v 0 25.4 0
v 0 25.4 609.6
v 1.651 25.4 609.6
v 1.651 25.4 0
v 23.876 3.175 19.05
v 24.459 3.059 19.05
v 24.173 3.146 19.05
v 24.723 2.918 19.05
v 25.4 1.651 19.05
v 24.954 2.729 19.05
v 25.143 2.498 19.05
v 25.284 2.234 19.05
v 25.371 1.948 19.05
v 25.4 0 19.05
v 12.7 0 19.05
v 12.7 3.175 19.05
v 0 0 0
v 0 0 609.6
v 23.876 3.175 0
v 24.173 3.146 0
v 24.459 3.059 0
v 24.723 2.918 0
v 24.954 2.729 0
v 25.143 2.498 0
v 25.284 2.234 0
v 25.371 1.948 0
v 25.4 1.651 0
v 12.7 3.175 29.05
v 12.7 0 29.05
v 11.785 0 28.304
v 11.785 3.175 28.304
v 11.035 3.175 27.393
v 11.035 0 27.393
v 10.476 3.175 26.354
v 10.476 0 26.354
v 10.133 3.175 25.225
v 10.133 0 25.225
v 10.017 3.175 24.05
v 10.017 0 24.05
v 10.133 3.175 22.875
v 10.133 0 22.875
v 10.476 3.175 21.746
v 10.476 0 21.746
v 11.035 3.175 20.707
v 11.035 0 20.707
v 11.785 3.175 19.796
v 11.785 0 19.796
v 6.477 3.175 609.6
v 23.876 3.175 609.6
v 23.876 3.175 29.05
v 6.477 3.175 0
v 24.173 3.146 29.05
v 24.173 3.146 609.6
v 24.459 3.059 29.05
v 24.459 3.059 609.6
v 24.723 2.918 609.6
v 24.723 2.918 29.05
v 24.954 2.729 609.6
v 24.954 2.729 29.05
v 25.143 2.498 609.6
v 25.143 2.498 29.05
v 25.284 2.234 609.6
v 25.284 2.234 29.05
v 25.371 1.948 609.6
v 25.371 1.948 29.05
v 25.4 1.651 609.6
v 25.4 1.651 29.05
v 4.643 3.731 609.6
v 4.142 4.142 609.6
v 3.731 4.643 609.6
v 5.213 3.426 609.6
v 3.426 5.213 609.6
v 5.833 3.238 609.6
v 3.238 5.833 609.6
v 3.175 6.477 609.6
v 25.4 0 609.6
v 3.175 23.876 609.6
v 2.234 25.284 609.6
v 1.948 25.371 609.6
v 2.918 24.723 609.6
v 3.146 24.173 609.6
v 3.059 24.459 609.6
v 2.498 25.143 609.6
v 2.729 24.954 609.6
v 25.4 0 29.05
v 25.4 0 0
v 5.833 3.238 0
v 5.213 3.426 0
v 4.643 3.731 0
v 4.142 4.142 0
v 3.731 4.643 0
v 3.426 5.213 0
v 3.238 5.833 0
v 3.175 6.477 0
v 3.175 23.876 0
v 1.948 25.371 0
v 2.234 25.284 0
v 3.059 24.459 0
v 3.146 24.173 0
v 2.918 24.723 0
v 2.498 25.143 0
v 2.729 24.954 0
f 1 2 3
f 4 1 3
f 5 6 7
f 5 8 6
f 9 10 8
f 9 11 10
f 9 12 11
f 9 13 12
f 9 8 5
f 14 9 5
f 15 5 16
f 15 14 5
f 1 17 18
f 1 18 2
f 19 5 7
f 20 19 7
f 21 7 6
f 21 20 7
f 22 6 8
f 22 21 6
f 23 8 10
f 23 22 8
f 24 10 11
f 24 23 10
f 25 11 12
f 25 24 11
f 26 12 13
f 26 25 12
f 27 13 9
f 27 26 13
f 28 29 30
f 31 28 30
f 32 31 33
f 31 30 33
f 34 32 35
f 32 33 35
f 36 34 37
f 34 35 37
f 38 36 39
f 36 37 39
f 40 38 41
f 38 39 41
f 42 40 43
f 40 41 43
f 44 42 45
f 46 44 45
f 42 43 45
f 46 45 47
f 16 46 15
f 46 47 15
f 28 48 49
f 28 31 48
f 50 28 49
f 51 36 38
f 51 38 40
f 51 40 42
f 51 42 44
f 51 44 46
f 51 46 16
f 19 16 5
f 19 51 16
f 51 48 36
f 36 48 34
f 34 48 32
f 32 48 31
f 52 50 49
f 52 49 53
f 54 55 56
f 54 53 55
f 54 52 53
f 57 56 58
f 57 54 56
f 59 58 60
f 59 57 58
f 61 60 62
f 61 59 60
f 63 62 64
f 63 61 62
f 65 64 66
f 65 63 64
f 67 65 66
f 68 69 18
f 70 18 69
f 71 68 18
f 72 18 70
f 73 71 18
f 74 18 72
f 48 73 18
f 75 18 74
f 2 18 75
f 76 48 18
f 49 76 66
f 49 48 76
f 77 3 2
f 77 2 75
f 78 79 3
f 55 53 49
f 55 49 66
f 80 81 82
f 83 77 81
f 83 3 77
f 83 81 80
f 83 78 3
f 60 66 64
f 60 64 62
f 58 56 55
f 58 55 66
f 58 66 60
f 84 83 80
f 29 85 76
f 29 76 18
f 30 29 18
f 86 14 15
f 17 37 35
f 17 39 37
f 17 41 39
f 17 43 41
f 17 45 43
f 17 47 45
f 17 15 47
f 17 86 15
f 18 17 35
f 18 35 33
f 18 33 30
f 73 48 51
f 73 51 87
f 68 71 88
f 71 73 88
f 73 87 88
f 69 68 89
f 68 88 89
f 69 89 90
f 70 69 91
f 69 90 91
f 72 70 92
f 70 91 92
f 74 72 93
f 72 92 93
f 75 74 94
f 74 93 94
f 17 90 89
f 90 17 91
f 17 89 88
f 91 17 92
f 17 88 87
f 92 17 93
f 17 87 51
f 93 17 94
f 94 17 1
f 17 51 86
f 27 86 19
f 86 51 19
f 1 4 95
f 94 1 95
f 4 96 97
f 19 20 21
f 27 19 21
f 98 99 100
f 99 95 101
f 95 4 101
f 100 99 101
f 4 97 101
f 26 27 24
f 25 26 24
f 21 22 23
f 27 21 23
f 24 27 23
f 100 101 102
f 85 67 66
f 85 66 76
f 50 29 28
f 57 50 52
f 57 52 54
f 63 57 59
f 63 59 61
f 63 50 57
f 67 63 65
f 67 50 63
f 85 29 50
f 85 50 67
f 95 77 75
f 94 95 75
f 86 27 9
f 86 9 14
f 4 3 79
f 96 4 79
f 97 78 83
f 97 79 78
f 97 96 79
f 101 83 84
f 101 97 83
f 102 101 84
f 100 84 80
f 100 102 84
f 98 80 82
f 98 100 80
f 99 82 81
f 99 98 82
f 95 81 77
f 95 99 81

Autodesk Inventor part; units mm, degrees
ref_plane "YZ Plane" through (0, 0, 0) normal (1, 0, 0) x (0, 1, 0)
ref_plane "Start plane" through (0, 0, 0) normal (0, 0, 1) x (1, 0, 0)
ref_plane "End plane" through (0, 0, 609.6) normal (0, 0, 1) x (1, 0, 0)
sketch "Sketch" plane through (0, 0, 0) normal (0, 0, 1) x (1, 0, 0)
  line L0 (25.4, 0) -> (0, 0)
  line L1 (0, 0) -> (0, 25.4)
  line L2 (0, 25.4) -> (1.651, 25.4)
  line L3 (3.175, 23.876) -> (3.175, 6.477)
  line L4 (6.477, 3.175) -> (23.876, 3.175)
  line L5 (25.4, 1.651) -> (25.4, 0)
  line L6 (0, -11.0414) -> (0, 31.5385) construction
  line L7 (-11.0414, 0) -> (31.5385, 0) construction
  arc A0 (3.175, 6.477) -> (6.477, 3.175) centre (6.477, 6.477) ccw
  arc A1 (3.175, 23.876) -> (1.651, 25.4) centre (1.651, 23.876) ccw
  arc A2 (25.4, 1.651) -> (23.876, 3.175) centre (23.876, 1.651) ccw
  line L8 (0, 40.0545) -> (0, -19.5574) construction
  line L9 (-19.5574, 0) -> (40.0545, 0) construction
  point P0 (3.175, 25.4)
  point P1 (3.175, 3.175)
  point P2 (25.4, 3.175)
  dimension "d0" = 25.4
  dimension "d1" = 25.4
  dimension "d2" = 3.175
  dimension "d3" = 3.175
  dimension "d10" = 0
  dimension "d11" = 0
  dimension "d14" = 3.302
  dimension "d15" = 1.524
extrude "Body" add sketch "Sketch" along normal up to surface (609.6 mm away) from surface at 0
sketch "Sketch3" plane through (0, 0, 0) normal (0, 0, 1) x (1, 0, 0)
  line L0 (0, 0) -> (10, 0)
ref_plane "Work Plane3" through (0, 0, 0) normal (0, -1, 0) x (1, 0, 0)
sketch "Sketch4" plane through (0, 0, 0) normal (0, -1, 0) x (1, 0, 0)
  line L0 (-2, 0) -> (12, 0)
  line L1 (-2, 609.6) -> (12, 609.6)
  dimension "d17" = 609.6
sketch "Sketch12" plane through (0, 0, 0) normal (0, -1, 0) x (1, 0, 0)
  line L0 (25.4, 0) -> (25.4, 609.6) projected
  line L1 (25.4, 19.05) -> (12.7, 19.05)
  line L2 (12.7, 19.05) -> (12.7, 29.05)
  line L3 (12.7, 29.05) -> (25.4, 29.05)
  line L4 (25.4, 29.05) -> (25.4, 19.05)
  line L5 (25.4, 0) -> (0, 0) projected
  arc A0 (12.7, 29.05) -> (12.7, 19.05) centre (16.0166, 24.05) ccw
  point P0 (25.4, 29.05)
  dimension "d47" = 12.7
  dimension "d48" = 10
  dimension "d49" = 19.05
  dimension "d50" = 6
extrude "Extrusion6" cut sketch "Sketch12" against normal through all
equation "\"d0\" = G_H"
equation "\"d1\" = G_H"
equation "\"d2\" = G_T"
equation "\"d3\" = G_T"
equation "\"d14\" = G_IR"
equation "\"d15\" = G_ER"
equation "\"d4\" = G_L"
equation "\"d47\" = axle_inset_up"
equation "\"d49\" = axle_inset_fwd"
equation "\"G_H\" = 25.4"
equation "\"G_T\" = 3.175"
equation "\"G_ER\" = 1.524"
equation "\"G_IR\" = 3.302"
equation "\"G_L\" = d17"
equation "\"ex\" = 0"
equation "\"G_OFFSET_START\" = 0"
equation "\"G_OFFSET_END\" = 0"
equation "\"d13\" = G_OFFSET_END + B_L"
equation "\"B_L\" = 609.6"
equation "\"axle_inset_up\" = 12.7"
equation "\"axle_inset_fwd\" = 19.05"
properties part number "AISC - L 1 x 1 x 1/8 - 24" material "Steel, Mild"
